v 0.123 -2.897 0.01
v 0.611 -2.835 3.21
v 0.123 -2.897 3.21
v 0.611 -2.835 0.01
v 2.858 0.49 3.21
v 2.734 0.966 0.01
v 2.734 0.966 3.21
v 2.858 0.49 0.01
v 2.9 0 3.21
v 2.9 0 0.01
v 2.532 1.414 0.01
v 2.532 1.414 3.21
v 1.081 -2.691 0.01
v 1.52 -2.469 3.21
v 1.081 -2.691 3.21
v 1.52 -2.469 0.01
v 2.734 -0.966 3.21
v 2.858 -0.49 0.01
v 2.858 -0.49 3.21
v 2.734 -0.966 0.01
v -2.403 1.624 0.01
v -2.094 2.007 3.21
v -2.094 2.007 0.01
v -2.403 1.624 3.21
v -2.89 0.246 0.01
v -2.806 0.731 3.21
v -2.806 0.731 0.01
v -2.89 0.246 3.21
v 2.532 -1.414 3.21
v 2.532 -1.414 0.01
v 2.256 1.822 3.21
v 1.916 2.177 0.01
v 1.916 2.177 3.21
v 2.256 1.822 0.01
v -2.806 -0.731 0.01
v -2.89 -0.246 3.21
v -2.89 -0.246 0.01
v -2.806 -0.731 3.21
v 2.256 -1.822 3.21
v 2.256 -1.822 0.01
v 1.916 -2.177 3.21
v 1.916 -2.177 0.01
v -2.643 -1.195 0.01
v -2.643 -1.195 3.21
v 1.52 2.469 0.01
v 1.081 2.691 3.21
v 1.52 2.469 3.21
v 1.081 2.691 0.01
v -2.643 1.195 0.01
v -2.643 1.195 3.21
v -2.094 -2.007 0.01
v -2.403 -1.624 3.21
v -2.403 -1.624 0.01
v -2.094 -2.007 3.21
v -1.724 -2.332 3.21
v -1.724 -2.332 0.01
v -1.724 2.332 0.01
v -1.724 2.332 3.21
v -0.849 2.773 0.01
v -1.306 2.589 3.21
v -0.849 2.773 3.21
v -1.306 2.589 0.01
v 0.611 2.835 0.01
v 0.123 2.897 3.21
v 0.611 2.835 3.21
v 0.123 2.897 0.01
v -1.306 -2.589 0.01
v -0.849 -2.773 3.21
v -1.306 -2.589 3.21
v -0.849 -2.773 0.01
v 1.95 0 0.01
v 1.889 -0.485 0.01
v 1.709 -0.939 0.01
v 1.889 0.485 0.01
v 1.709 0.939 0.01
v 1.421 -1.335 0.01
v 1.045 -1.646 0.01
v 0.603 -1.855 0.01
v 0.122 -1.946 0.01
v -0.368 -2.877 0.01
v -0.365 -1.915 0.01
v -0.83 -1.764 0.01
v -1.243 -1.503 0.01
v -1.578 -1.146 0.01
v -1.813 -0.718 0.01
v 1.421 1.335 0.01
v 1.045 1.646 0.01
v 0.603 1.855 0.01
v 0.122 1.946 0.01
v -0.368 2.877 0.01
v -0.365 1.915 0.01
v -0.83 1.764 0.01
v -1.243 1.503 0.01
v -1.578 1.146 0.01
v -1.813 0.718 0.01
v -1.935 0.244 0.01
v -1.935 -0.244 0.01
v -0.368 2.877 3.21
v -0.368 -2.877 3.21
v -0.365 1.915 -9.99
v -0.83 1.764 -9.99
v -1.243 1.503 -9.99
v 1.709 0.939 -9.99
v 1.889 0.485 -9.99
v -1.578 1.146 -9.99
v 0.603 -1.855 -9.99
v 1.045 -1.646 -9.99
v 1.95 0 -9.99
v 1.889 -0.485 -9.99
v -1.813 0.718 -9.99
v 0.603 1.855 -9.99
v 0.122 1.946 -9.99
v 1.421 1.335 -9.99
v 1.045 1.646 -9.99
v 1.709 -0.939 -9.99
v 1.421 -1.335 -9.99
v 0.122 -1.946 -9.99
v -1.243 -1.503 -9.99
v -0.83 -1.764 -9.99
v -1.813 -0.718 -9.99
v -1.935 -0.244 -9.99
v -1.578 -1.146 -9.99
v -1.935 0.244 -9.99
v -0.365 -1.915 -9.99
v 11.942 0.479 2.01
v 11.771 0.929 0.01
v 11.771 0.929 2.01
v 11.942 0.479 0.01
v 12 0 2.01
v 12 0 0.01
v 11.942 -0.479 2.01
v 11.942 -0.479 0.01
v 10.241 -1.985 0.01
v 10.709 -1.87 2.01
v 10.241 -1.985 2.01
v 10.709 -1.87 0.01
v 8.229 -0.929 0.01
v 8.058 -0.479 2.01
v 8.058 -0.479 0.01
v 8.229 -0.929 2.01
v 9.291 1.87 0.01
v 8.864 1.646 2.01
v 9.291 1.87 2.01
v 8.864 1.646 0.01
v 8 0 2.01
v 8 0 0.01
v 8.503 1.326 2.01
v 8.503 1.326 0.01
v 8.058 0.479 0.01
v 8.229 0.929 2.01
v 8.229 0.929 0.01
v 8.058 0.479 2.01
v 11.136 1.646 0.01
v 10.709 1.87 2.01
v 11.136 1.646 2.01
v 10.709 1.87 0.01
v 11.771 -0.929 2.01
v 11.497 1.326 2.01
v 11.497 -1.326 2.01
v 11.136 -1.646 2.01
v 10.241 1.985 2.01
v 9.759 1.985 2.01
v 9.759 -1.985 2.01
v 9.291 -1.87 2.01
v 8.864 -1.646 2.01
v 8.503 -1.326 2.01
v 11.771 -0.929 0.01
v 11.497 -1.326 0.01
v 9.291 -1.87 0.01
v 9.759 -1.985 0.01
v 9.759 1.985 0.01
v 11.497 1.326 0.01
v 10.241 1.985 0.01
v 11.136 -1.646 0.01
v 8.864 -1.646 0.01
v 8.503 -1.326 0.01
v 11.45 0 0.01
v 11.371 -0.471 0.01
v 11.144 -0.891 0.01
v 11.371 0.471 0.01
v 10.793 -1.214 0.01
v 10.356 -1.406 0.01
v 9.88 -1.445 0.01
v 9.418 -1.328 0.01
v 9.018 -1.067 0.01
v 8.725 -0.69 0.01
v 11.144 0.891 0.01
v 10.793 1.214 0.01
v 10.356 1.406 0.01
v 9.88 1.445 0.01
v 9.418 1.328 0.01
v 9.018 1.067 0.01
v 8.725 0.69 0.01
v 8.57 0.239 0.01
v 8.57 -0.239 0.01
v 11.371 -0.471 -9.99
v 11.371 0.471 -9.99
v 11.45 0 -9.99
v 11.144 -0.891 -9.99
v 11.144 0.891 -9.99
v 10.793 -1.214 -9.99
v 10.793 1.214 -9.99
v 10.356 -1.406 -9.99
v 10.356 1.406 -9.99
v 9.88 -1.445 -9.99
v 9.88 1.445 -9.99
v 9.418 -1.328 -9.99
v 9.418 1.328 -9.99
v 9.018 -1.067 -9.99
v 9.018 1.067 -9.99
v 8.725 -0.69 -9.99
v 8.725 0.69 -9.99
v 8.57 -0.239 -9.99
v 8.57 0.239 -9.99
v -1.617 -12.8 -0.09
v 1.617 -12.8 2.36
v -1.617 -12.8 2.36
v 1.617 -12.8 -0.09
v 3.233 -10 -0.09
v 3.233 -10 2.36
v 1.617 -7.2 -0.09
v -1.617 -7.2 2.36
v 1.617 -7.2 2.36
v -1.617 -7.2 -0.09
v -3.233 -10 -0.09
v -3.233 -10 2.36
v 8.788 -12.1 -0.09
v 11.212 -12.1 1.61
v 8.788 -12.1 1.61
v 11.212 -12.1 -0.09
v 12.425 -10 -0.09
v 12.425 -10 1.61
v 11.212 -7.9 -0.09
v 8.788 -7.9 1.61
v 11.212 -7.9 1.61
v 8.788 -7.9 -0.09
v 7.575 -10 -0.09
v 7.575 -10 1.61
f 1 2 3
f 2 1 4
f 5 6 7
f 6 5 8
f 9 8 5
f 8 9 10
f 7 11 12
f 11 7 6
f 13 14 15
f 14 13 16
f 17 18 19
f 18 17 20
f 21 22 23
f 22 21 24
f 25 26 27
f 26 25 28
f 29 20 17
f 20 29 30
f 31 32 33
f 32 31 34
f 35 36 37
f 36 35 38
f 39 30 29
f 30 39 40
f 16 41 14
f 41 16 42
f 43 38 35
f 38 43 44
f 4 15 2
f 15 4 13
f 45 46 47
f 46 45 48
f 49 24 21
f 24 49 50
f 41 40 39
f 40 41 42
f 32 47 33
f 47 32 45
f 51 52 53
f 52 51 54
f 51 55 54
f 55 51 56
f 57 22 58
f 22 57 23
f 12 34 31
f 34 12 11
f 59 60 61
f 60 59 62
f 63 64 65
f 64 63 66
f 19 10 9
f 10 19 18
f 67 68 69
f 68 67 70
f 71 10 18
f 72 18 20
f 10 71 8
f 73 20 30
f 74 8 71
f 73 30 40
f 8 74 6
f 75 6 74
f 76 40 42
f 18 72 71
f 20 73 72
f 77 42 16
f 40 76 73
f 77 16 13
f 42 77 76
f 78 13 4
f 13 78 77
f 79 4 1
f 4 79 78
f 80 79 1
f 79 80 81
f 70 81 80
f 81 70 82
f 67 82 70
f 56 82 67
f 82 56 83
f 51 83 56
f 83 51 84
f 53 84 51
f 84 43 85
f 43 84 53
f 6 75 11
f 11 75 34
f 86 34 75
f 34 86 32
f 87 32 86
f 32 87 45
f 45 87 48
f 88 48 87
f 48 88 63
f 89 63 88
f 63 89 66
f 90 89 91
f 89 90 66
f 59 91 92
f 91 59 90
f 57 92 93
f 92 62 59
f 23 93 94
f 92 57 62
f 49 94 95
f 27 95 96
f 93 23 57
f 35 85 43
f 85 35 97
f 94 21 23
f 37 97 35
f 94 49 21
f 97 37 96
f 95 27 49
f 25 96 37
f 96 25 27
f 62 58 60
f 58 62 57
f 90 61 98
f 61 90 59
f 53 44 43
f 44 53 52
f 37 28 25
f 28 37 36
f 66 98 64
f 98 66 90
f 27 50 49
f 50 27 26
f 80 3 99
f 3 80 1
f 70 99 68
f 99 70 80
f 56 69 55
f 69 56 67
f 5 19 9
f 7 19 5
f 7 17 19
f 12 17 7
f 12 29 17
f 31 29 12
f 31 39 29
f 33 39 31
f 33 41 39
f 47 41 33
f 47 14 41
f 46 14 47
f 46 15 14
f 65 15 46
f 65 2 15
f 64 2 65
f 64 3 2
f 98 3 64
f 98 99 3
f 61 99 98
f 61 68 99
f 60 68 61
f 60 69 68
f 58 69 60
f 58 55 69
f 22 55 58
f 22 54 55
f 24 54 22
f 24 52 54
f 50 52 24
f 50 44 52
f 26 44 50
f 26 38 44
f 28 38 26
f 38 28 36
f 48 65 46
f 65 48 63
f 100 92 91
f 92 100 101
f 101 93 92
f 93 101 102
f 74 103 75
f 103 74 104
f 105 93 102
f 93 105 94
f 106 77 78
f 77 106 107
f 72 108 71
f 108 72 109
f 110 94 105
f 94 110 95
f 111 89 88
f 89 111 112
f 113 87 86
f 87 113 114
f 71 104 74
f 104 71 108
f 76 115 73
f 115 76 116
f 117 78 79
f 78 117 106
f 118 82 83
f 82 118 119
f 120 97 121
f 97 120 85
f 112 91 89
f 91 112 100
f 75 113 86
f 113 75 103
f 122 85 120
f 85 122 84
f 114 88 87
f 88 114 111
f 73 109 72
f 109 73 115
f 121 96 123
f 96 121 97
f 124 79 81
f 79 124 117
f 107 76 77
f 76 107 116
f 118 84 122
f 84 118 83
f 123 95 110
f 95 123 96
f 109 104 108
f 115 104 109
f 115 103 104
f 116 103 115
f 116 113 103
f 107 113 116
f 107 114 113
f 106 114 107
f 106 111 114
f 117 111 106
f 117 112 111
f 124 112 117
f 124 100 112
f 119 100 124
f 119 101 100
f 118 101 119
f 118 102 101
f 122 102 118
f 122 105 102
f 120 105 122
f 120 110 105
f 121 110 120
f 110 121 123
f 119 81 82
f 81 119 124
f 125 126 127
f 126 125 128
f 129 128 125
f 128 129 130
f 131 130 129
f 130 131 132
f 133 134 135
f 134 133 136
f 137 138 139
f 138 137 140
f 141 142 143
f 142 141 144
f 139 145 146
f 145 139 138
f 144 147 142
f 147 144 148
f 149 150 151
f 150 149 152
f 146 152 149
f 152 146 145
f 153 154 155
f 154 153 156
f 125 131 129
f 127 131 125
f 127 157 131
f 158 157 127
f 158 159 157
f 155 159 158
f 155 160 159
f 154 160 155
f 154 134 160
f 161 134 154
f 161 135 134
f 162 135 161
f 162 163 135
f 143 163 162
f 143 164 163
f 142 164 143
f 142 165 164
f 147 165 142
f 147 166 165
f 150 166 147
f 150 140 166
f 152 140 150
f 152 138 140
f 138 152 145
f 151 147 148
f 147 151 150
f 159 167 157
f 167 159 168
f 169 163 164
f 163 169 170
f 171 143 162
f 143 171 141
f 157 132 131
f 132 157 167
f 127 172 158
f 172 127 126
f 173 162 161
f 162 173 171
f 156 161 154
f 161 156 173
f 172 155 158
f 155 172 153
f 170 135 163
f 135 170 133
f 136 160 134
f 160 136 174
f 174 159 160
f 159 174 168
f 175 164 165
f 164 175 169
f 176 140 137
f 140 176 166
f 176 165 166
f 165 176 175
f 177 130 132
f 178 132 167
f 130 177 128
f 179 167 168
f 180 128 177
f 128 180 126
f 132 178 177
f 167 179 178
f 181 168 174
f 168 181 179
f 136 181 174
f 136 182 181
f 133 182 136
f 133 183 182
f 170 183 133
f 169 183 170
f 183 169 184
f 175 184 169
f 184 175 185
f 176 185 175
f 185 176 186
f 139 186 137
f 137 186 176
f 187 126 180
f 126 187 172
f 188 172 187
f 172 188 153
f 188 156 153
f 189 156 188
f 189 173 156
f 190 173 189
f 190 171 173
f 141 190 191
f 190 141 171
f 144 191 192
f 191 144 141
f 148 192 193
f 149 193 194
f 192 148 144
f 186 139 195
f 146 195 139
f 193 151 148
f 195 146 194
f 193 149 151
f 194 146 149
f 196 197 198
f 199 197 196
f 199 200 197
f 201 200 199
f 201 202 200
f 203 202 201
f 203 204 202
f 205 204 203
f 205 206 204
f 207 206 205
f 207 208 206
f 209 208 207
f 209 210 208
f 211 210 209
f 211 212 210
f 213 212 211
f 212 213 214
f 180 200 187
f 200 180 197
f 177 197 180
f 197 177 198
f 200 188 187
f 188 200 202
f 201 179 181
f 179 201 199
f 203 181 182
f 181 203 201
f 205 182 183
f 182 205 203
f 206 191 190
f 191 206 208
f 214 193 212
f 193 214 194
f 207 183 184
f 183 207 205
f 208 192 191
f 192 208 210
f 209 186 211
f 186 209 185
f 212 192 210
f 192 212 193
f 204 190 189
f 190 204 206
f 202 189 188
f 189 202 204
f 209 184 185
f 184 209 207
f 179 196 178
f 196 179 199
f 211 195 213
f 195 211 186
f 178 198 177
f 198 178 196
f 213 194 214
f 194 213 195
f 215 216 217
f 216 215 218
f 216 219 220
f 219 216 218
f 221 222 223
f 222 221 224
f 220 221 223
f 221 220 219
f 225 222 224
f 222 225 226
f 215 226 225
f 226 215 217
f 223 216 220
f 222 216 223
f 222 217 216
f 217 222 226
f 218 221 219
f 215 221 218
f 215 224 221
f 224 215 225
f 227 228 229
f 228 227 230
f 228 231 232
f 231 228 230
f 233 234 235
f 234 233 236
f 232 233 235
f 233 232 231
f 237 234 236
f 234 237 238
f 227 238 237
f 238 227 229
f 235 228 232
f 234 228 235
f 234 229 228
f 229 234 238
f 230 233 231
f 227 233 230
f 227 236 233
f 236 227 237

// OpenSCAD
// file: ../Polygon.scad
//============================================================
// OpenSCAD
// Regular Convex Polygon Library
// Last Modified : 2015/10/28
//============================================================
/*

	Definition

	N = Number of Side N >=3
	A = apothem
		radius of inside circle
	R = circumradius
		Radius of outside circle
	S = Side
		Lenght of a side

	Build polygon with the Apothem :
	N and A is known
	Need to calculate S then R
	use $fn

	Build Polygon with Circumradius
	N and R known
	use $fn

	Build Polygon with Side
	N and S Known
	Need to calculate R and optionaly A
	use $fn	

	TO DO
    Control result

	For more information :
	http://en.wikipedia.org/wiki/Regular_polygon

*/

//------------------------------------------------------------
//
//------------------------------------------------------------
Demo();

//------------------------------------------------------------
// Demo
//------------------------------------------------------------
module Demo()
{
	inch = 25.4;	// 25.4mm
	// A = apothem - it's a RADIUS !
	// For a bolt of 4 inches spécify A=2*inch
	//Polygon(N=7,A=2*inch,h=0);	// 4 inches radius Polygon
	//Polygon(N=7,A=49.8365,h=0);
	//Trigon(A=50,h=10);			// N=3
	//Dodecagon(A=50,h=0);			// N=12

    //rotate([0,0,360/7/2])
	//Nonagon(R=55.3144,h=10,debug=true);

	//Polygon(N=6,A=60,h=0,debug=false);
	//Polygon(N=6,A=60,h=5,debug=true);

    Enneagon(A=50);
}


//------------------------------------------------------------
// Polygon : 
//------------------------------------------------------------
module Polygon(N=3,A=0,R=0,S=0,h=0,debug=false)
{
	N = ( N < 3 ? 3 : N );

	angle = 360/N;
	angleA = angle/2;

	if (debug)
	{
		echo("N = ", N);
		echo("A = ", A);
		echo("S = ", S);
		echo("R = ", R);
	}

	if ( A > 0 )		// if A assign R and S
	{
        S = 2 * A * tan(angleA);							// assign
		//R = (S/2) / sin(angleA);						// no assign ???
		R = ( A * tan(angleA) ) / sin(angleA);		// asign
		_Build_Polygon(N=N,R=R,h=h);
		if (debug)
		{
			echo("aN = ", N);
			echo("aA = ", A);
			echo("aS = ", S);
			echo("aR = ", R);
			#cylinder(r=A,h=h+1,center=true,$fn=150);
			%cylinder(r=R,h=h+1,center=true,$fn=150);
		}
	}
	else
	{
		if ( S > 0 )		// if S assign R and A
		{
			R = (S/2) / sin(angleA);			// assign
			A = S / ( 2 * tan(angleA) );		// assign
            _Build_Polygon(N=N,R=R,h=h);
			if (debug)
			{
				echo("sN = ", N);
				echo("sA = ", A);
				echo("sS = ", S);
				echo("sR = ", R);
				#cylinder(r=A,h=h+1,center=true,$fn=150);
				%cylinder(r=R,h=h+1,center=true,$fn=150);
			}
		}
		else
		{
			if ( R == 0 )		// default
			{
				S = 2 * R * sin(angleA);			// no assign ???
				A = S / ( 2 * tan(angleA) );		// no assign ???
				_Build_Polygon(N=N,h=h);
				if (debug)
				{
					echo("0N = ", N);
					echo("0A = ", A);
					echo("0S = ", S);
					echo("0R = ", R);
					#cylinder(r=A,h=h+1,center=true,$fn=150);
					%cylinder(r=R,h=h+1,center=true,$fn=150);
				}
			}
			else		// build with R
			{
				S = 2 * R * sin(angleA);
				A = S / ( 2 * tan(angleA) );			// no assign ???
				//A = R * ( sin(angleA) / tan(angleA) )	// no assign ???
				_Build_Polygon(N=N,R=R,h=h);
				if (debug)
				{
					echo("rN = ", N);
					echo("rA = ", A);
					echo("rS = ", S);
					echo("rR = ", R);
					%cylinder(r=R,h=h+1,center=true,$fn=150);
				}
			}
		}
	}

	if (debug)
	{
		echo("fN = ", N);
		echo("fA = ", A);
		echo("fS = ", S);
		echo("fR = ", R);
	}
}

//------------------------------------------------------------
// Build
//------------------------------------------------------------
module _Build_Polygon(N=3,R=1,h=0)
{
	if (h > 0)
	{
		// 3D primitive h>0
		cylinder(r=R,h=h,$fn=N,center=true);
	}
	else
	{
		// 2D primitive h=0
		circle(r=R,$fn=N,center=true);
	}
}

//------------------------------------------------------------
// Building lots from N=3, N=N+1
// http://en.wikipedia.org/wiki/Polygon
//------------------------------------------------------------

// 3 sides
module Trigon(A=0,R=0,S=0,h=0,debug=false)
	{Polygon(N=3,A=A,R=R,S=S,h=h,debug=debug);}

module Triangle(A=0,R=0,S=0,h=0,debug=false)
	{Polygon(N=3,A=A,R=R,S=S,h=h,debug=debug);}

// 4 sides
module Tetragon(A=0,R=0,S=0,h=0,debug=false)
	{Polygon(N=4,A=A,R=R,S=S,h=h,debug=debug);}

module Quadrilateral(A=0,R=0,S=0,h=0,debug=false)
	{Polygon(N=4,A=A,R=R,S=S,h=h,debug=debug);}

module Quadrangle(A=0,R=0,S=0,h=0,debug=false)
	{Polygon(N=4,A=A,R=R,S=S,h=h,debug=debug);}

// 5 sides
module Pentagon(A=0,R=0,S=0,h=0,debug=false)
	{Polygon(N=5,A=A,R=R,S=S,h=h,debug=debug);}

// 6 sides
module Hexagon(A=0,R=0,S=0,h=0,debug=false)
	{Polygon(N=6,A=A,R=R,S=S,h=h,debug=debug);}

// 7 sides
module Heptagon(A=0,R=0,S=0,h=0,debug=false)
	{Polygon(N=7,A=A,R=R,S=S,h=h,debug=debug);}

// 8 sides
module Octagon(A=0,R=0,S=0,h=0,debug=false)
	{Polygon(N=8,A=A,R=R,S=S,h=h,debug=debug);}

// 9 sides
module Enneagon(A=0,R=0,S=0,h=0,debug=false)
	{Polygon(N=9,A=A,R=R,S=S,h=h,debug=debug);}

module Nonagon(A=0,R=0,S=0,h=0,debug=false)
	{Polygon(N=9,A=A,R=R,S=S,h=h,debug=debug);}

// 10 sides
module Decagon(A=0,R=0,S=0,h=0,debug=false)
	{Polygon(N=10,A=A,R=R,S=S,h=h,debug=debug);}

// 11 sides
module Handecagon(A=0,R=0,S=0,h=0,debug=false)
	{Polygon(N=11,A=A,R=R,S=S,h=h,debug=debug);}

// 12 sides
module Dodecagon(A=0,R=0,S=0,h=0,debug=false)
	{Polygon(N=12,A=A,R=R,S=S,h=h,debug=debug);}

// ...

// 100 sides
module Hectogon(A=0,R=0,S=0,h=0,debug=false)
	{Polygon(N=100,A=A,R=R,S=S,h=h,debug=debug);}

//==EOF=======================================================
// file: ../Bolt.scad
include <defaults.scad>;

module Bolt(
  l=10,
  h_head=5,
  d_head=10,
  d=5,
  tolerance=default_metric_tolerance,
  inset=1,
  extra_tolerance=default_bolt_extra_tolerance
) {
  r_head = d_head/2;
  r = d/2;

  translate([0, 0, -inset*h_head]){
    translate([0, 0, 0.01])
    cylinder(r=r_head+tolerance*2, h=h_head);

    translate([0, 0, -l+0.01])
    cylinder(r=r+tolerance*2+extra_tolerance, h=l+0.01);
  }
}
// file: ../Nut.scad
include <defaults.scad>;
use <Polygon.scad>;

module Nut(
  h=10,
  A=10,
  tolerance=default_metric_tolerance,
  inset=1
) {
  translate([0, 0, -h/2+0.01+((1-inset)*h)])
  Hexagon(
    A=A+tolerance,
    h=h+tolerance*2
  );
}
// file: ../defaults.scad
default_metric_tolerance = 0.1;
default_bolt_extra_tolerance = 0.25;
// file: ../M2.scad
include <defaults.scad>;
use <Nut.scad>;
use <Bolt.scad>;

h_nut_m2 = 1.5;
a_nut_m2 = 4;
A_nut_m2 = a_nut_m2 / 2;
d_head_m2 = 3.6;
h_head_m2 = 2;
d_m2 = 2; //1.86;

module NutM2(tolerance=default_metric_tolerance, h=h_nut_m2, inset=1) {
  Nut(h=h, A=A_nut_m2, tolerance=tolerance, inset=inset);
}

module BoltM2(l=10, tolerance=default_metric_tolerance, inset=1) {
  Bolt(l=l, h_head=h_head_m2, d_head=d_head_m2, d=d_m2, tolerance=tolerance, inset=inset);
}
// file: ../M3.scad
include <defaults.scad>;
use <Nut.scad>;
use <Bolt.scad>;

h_nut_m3 = 2.25;
a_nut_m3 = 5.4;
A_nut_m3 = a_nut_m3 / 2;
d_head_m3 = 5.4;
h_head_m3 = 3.2;
d_m3 = 3;

module NutM3(tolerance=default_metric_tolerance, h=h_nut_m3, inset=1) {
  Nut(h=h, A=A_nut_m3, tolerance=tolerance, inset=inset);
}

module BoltM3(l=10, tolerance=default_metric_tolerance, inset=1) {
  Bolt(l=l, h_head=h_head_m3, d_head=d_head_m3, d=d_m3, tolerance=tolerance, inset=inset);
}
// main file
use <../M3.scad>;
use <../M2.scad>;

$fs = 0.5;
$fa = 2;

BoltM3(inset=0);

translate([0, -10, 0])
NutM3(inset=0);

translate([10, 0, 0])
BoltM2(inset=0);

translate([10, -10, 0])
NutM2(inset=0);
